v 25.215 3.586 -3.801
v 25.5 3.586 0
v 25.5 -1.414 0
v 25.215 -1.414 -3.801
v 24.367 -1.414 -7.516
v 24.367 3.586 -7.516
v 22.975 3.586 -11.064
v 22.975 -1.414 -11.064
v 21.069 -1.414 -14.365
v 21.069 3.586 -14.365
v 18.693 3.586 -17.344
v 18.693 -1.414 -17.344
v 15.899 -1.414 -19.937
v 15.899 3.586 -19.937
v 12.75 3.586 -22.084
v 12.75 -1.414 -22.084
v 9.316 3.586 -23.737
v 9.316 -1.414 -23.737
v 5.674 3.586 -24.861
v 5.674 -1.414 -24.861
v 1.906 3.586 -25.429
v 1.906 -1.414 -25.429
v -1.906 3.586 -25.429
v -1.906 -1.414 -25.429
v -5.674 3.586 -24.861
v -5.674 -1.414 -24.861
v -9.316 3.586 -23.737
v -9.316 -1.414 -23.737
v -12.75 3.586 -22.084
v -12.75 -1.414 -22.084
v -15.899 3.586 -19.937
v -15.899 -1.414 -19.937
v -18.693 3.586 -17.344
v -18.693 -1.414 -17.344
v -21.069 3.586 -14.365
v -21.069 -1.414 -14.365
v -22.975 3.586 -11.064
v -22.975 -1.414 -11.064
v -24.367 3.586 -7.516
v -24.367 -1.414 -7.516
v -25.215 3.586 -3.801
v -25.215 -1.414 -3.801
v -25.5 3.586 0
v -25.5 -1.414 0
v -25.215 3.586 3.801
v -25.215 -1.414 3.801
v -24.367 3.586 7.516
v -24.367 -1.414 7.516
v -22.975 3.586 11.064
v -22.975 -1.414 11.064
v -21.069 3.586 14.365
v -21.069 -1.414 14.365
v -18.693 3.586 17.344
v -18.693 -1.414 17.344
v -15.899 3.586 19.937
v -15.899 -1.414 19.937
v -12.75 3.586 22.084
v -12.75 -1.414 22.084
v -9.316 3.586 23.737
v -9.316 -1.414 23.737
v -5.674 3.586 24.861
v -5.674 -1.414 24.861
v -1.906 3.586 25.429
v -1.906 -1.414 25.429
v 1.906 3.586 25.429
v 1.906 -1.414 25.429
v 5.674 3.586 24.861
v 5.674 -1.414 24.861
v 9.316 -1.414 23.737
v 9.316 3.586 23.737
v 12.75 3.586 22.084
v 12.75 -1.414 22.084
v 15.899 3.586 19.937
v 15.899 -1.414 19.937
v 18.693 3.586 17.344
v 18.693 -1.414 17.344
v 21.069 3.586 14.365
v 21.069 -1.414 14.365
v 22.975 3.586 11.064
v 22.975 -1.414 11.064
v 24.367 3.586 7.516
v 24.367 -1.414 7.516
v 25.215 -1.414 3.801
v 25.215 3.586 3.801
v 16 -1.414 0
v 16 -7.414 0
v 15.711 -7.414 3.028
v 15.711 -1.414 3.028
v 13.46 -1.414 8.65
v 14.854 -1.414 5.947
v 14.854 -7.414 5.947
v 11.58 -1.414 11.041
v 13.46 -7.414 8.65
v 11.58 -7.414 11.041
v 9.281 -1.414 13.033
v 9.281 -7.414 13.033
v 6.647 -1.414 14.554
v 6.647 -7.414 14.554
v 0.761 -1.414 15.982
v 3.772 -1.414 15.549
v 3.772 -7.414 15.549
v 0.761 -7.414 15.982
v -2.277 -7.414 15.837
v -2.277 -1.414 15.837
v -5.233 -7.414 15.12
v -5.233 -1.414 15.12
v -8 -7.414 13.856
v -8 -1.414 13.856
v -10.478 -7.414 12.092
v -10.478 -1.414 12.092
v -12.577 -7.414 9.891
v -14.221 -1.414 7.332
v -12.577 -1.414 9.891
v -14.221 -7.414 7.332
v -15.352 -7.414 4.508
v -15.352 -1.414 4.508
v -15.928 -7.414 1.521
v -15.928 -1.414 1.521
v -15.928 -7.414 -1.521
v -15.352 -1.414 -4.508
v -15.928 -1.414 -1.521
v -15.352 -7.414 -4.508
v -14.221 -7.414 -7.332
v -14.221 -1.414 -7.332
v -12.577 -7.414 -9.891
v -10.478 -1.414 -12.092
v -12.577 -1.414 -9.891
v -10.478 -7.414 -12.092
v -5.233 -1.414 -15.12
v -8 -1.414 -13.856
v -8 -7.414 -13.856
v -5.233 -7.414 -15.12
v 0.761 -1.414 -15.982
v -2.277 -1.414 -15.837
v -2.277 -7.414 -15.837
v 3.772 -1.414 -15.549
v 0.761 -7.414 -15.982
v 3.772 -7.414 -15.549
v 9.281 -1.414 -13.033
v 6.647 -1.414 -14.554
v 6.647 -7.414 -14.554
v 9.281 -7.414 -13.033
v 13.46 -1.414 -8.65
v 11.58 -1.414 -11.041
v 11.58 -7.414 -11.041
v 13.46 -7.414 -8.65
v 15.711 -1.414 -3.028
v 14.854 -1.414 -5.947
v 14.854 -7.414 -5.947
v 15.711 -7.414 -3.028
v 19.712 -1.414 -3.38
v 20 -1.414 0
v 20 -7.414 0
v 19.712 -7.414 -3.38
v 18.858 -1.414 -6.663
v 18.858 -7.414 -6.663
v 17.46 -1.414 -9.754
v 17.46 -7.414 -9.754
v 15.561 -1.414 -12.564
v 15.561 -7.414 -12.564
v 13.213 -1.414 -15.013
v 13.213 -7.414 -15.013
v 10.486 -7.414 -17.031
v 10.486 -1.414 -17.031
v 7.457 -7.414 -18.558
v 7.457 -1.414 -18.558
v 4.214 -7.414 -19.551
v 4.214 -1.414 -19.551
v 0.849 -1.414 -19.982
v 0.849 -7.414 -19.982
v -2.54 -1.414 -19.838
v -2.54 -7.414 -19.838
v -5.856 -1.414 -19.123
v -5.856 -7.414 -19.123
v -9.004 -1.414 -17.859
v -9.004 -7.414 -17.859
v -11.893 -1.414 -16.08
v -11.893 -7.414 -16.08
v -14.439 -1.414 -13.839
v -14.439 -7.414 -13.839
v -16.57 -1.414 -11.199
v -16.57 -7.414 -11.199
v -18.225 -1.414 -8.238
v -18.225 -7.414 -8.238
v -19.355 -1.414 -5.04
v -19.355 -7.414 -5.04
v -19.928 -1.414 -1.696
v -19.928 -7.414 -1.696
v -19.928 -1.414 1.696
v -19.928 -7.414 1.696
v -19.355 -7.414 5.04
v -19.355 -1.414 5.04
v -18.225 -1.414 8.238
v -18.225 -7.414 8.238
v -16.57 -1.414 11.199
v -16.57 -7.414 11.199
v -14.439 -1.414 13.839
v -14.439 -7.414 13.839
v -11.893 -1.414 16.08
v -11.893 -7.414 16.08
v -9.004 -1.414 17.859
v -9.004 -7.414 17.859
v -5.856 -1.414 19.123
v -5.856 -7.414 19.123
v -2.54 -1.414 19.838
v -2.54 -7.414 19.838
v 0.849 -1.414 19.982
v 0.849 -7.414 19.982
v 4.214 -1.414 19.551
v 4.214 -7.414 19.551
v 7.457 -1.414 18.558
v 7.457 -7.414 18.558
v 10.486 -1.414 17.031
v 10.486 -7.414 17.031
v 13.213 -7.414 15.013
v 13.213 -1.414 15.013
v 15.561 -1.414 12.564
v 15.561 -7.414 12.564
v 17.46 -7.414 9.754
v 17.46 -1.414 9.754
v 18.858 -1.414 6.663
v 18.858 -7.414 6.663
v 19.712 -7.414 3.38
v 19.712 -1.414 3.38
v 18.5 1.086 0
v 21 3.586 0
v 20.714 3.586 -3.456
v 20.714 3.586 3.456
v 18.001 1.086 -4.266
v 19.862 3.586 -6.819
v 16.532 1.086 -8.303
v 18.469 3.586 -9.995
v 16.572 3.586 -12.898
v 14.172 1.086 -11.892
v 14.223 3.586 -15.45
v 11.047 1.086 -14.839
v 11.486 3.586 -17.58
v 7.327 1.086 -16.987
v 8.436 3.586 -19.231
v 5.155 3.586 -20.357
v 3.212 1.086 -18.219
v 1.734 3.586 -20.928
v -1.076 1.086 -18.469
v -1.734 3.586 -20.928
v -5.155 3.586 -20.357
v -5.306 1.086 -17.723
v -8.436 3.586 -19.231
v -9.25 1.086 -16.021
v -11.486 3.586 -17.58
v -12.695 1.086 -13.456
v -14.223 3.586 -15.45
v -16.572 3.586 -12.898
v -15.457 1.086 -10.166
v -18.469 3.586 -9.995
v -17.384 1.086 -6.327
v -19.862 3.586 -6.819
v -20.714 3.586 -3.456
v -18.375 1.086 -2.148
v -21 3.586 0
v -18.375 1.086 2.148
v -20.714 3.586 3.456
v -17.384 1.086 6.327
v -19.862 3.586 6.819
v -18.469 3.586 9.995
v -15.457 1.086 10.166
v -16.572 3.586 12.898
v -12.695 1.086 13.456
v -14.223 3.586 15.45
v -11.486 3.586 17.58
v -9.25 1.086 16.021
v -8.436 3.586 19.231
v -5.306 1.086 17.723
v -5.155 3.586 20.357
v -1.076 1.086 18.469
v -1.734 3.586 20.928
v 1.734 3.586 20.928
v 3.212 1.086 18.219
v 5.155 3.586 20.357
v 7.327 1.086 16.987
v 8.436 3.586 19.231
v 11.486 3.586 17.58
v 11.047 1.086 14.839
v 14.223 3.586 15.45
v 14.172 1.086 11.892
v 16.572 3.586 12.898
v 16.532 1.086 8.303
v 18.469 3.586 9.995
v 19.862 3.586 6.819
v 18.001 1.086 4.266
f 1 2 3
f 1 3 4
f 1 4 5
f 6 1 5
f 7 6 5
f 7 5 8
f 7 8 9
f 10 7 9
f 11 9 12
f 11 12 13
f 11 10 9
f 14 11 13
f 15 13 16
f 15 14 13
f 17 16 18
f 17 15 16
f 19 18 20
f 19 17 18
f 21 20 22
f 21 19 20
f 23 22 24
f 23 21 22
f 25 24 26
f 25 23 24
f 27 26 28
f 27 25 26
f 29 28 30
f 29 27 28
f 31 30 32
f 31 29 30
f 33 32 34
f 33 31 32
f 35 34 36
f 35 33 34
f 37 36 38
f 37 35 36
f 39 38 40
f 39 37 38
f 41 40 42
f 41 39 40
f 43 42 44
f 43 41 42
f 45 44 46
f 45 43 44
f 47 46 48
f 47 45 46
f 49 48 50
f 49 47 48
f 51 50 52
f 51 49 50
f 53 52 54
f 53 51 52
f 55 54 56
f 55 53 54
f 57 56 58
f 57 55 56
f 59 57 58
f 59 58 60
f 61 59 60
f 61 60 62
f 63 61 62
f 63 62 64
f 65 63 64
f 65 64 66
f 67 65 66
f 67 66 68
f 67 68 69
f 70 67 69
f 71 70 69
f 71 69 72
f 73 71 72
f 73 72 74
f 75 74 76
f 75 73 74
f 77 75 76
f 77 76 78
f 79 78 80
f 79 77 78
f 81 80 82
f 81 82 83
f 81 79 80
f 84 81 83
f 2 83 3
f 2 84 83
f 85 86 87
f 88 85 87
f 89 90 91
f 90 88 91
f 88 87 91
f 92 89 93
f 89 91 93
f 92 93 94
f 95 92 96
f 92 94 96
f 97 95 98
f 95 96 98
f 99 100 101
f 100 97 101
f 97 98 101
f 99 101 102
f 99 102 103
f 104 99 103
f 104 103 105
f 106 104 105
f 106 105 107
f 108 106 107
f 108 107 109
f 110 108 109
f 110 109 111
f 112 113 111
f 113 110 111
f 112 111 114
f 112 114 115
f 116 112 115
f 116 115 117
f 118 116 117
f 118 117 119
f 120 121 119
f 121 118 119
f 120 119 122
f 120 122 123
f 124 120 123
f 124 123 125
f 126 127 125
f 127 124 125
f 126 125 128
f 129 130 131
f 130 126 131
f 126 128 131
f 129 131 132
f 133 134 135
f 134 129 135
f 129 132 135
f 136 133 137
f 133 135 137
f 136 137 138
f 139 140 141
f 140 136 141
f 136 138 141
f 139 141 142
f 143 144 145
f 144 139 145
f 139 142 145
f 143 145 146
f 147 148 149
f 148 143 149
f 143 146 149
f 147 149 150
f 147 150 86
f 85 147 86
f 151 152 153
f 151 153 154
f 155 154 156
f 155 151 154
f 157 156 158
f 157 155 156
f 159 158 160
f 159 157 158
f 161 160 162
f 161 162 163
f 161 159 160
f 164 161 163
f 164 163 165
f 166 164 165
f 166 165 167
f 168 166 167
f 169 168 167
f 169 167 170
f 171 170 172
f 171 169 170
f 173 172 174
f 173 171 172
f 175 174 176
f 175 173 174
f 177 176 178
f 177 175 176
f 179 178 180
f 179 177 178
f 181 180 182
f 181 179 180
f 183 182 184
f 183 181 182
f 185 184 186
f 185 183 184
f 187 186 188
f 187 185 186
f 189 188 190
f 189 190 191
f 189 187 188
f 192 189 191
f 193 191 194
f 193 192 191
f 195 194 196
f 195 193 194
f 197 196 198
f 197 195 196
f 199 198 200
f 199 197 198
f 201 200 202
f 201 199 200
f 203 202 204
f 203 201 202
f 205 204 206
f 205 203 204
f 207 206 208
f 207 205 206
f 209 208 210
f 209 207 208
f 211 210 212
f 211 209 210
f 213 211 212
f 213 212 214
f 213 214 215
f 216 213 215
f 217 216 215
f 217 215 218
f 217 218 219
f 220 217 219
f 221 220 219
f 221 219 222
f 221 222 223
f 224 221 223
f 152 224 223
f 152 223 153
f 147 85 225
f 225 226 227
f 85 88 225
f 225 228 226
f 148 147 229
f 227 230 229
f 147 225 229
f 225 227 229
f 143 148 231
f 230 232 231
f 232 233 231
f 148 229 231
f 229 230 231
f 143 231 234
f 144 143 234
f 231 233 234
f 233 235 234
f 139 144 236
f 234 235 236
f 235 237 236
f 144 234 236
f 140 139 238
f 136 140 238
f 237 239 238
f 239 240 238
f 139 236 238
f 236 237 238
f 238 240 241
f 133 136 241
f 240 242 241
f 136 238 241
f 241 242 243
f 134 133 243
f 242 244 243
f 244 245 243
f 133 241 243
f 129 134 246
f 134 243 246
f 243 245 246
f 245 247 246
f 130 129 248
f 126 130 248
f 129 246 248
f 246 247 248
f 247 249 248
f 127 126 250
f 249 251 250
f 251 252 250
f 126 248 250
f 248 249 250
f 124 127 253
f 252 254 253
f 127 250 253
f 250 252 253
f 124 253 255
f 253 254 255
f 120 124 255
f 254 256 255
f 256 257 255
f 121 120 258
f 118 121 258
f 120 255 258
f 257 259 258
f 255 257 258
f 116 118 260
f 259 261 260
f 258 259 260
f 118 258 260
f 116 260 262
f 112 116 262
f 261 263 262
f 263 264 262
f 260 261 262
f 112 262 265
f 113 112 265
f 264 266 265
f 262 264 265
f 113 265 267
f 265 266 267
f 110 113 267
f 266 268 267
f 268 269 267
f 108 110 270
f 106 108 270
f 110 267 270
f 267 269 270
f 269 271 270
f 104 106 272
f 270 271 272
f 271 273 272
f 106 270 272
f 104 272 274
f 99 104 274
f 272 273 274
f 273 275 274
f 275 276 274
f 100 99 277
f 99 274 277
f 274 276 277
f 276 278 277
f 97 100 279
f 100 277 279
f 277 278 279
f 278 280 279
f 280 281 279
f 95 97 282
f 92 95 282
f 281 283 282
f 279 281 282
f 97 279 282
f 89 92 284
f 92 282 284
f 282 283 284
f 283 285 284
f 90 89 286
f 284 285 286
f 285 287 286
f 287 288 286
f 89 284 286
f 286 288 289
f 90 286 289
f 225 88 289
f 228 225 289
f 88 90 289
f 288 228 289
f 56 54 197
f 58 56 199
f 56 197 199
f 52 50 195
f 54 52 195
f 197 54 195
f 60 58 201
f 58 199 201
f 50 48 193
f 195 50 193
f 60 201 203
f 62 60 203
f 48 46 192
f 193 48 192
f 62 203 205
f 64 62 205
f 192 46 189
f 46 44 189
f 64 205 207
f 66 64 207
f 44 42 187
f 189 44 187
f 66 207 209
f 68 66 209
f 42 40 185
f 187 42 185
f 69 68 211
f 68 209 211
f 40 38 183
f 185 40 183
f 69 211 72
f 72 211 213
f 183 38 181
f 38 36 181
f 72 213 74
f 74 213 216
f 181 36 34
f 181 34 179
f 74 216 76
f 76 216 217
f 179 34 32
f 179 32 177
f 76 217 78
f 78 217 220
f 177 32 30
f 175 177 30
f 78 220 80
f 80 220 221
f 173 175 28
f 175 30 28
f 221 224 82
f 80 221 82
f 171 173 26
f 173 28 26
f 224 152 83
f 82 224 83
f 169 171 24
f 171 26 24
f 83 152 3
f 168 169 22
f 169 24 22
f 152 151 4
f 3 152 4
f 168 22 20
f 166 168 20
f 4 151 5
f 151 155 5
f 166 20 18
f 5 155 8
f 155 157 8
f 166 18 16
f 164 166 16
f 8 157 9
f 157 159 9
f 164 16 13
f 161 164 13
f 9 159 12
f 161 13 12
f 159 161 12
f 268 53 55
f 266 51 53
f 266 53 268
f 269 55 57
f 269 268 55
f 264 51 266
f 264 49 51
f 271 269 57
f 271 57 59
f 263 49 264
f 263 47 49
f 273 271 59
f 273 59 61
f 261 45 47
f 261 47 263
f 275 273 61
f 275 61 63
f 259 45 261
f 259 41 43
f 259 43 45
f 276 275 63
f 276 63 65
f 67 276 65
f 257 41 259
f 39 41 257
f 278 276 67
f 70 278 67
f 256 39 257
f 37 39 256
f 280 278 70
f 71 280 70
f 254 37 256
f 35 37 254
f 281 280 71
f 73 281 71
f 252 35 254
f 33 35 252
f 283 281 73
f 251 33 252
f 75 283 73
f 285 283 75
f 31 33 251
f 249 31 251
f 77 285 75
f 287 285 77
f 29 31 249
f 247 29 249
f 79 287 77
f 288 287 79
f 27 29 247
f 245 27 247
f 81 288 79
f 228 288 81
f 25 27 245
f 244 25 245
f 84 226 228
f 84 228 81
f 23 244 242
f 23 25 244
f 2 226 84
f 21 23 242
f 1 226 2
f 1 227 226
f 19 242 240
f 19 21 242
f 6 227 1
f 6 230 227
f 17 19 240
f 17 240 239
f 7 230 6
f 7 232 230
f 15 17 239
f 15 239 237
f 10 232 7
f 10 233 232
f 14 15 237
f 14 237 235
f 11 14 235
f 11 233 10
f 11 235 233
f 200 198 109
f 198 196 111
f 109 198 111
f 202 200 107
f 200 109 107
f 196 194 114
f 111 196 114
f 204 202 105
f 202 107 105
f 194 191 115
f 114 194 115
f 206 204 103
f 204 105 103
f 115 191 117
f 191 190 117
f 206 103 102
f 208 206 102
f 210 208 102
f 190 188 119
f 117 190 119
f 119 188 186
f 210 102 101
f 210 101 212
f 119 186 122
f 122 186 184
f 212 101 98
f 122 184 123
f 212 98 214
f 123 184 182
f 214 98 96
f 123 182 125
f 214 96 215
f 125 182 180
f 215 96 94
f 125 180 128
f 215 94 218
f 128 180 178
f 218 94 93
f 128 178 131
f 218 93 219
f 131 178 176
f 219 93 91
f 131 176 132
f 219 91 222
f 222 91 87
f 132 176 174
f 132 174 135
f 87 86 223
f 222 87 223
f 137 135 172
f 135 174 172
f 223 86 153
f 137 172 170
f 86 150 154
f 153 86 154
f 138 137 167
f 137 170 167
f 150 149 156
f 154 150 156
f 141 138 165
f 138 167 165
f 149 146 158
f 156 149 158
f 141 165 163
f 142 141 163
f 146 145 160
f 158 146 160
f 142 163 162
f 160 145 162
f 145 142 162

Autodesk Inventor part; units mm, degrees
ref_plane "YZ Plane" through (0, 0, 0) normal (1, 0, 0) x (0, 1, 0)
ref_plane "XZ Plane" through (0, 0, 0) normal (0, 1, 0) x (-1, 0, 0)
ref_plane "XY Plane" through (0, 0, 0) normal (0, 0, 1) x (1, 0, 0)
sketch "Sketch1" plane through (0, 0, 0) normal (0, 0, 1) x (1, 0, 0)
  line L0 (0, -8.5138) -> (0, 6.8862) projected
  line L1 (16, 3.5862) -> (16, -7.4138)
  line L2 (16, -7.4138) -> (20, -7.4138)
  line L3 (20, -7.4138) -> (20, -1.4138)
  line L4 (20, -1.4138) -> (25.5, -1.4138)
  line L5 (25.5, -1.4138) -> (25.5, 3.5862)
  line L6 (25.5, 3.5862) -> (16, 3.5862)
  dimension "d0" = 32
  dimension "d1" = 51
  dimension "d2" = 40
  dimension "d3" = 5
  dimension "d4" = 11
revolve "Revolution1" add sketch "Sketch1" angle 360 about axis through (0, -10, 0) along (0, 1, 0)
chamfer "Chamfer1" distance 5 angle 45 1 edges at (-16, 3.5862, 0)
properties part number "Seat" material "Bronze, Soft Tin"
